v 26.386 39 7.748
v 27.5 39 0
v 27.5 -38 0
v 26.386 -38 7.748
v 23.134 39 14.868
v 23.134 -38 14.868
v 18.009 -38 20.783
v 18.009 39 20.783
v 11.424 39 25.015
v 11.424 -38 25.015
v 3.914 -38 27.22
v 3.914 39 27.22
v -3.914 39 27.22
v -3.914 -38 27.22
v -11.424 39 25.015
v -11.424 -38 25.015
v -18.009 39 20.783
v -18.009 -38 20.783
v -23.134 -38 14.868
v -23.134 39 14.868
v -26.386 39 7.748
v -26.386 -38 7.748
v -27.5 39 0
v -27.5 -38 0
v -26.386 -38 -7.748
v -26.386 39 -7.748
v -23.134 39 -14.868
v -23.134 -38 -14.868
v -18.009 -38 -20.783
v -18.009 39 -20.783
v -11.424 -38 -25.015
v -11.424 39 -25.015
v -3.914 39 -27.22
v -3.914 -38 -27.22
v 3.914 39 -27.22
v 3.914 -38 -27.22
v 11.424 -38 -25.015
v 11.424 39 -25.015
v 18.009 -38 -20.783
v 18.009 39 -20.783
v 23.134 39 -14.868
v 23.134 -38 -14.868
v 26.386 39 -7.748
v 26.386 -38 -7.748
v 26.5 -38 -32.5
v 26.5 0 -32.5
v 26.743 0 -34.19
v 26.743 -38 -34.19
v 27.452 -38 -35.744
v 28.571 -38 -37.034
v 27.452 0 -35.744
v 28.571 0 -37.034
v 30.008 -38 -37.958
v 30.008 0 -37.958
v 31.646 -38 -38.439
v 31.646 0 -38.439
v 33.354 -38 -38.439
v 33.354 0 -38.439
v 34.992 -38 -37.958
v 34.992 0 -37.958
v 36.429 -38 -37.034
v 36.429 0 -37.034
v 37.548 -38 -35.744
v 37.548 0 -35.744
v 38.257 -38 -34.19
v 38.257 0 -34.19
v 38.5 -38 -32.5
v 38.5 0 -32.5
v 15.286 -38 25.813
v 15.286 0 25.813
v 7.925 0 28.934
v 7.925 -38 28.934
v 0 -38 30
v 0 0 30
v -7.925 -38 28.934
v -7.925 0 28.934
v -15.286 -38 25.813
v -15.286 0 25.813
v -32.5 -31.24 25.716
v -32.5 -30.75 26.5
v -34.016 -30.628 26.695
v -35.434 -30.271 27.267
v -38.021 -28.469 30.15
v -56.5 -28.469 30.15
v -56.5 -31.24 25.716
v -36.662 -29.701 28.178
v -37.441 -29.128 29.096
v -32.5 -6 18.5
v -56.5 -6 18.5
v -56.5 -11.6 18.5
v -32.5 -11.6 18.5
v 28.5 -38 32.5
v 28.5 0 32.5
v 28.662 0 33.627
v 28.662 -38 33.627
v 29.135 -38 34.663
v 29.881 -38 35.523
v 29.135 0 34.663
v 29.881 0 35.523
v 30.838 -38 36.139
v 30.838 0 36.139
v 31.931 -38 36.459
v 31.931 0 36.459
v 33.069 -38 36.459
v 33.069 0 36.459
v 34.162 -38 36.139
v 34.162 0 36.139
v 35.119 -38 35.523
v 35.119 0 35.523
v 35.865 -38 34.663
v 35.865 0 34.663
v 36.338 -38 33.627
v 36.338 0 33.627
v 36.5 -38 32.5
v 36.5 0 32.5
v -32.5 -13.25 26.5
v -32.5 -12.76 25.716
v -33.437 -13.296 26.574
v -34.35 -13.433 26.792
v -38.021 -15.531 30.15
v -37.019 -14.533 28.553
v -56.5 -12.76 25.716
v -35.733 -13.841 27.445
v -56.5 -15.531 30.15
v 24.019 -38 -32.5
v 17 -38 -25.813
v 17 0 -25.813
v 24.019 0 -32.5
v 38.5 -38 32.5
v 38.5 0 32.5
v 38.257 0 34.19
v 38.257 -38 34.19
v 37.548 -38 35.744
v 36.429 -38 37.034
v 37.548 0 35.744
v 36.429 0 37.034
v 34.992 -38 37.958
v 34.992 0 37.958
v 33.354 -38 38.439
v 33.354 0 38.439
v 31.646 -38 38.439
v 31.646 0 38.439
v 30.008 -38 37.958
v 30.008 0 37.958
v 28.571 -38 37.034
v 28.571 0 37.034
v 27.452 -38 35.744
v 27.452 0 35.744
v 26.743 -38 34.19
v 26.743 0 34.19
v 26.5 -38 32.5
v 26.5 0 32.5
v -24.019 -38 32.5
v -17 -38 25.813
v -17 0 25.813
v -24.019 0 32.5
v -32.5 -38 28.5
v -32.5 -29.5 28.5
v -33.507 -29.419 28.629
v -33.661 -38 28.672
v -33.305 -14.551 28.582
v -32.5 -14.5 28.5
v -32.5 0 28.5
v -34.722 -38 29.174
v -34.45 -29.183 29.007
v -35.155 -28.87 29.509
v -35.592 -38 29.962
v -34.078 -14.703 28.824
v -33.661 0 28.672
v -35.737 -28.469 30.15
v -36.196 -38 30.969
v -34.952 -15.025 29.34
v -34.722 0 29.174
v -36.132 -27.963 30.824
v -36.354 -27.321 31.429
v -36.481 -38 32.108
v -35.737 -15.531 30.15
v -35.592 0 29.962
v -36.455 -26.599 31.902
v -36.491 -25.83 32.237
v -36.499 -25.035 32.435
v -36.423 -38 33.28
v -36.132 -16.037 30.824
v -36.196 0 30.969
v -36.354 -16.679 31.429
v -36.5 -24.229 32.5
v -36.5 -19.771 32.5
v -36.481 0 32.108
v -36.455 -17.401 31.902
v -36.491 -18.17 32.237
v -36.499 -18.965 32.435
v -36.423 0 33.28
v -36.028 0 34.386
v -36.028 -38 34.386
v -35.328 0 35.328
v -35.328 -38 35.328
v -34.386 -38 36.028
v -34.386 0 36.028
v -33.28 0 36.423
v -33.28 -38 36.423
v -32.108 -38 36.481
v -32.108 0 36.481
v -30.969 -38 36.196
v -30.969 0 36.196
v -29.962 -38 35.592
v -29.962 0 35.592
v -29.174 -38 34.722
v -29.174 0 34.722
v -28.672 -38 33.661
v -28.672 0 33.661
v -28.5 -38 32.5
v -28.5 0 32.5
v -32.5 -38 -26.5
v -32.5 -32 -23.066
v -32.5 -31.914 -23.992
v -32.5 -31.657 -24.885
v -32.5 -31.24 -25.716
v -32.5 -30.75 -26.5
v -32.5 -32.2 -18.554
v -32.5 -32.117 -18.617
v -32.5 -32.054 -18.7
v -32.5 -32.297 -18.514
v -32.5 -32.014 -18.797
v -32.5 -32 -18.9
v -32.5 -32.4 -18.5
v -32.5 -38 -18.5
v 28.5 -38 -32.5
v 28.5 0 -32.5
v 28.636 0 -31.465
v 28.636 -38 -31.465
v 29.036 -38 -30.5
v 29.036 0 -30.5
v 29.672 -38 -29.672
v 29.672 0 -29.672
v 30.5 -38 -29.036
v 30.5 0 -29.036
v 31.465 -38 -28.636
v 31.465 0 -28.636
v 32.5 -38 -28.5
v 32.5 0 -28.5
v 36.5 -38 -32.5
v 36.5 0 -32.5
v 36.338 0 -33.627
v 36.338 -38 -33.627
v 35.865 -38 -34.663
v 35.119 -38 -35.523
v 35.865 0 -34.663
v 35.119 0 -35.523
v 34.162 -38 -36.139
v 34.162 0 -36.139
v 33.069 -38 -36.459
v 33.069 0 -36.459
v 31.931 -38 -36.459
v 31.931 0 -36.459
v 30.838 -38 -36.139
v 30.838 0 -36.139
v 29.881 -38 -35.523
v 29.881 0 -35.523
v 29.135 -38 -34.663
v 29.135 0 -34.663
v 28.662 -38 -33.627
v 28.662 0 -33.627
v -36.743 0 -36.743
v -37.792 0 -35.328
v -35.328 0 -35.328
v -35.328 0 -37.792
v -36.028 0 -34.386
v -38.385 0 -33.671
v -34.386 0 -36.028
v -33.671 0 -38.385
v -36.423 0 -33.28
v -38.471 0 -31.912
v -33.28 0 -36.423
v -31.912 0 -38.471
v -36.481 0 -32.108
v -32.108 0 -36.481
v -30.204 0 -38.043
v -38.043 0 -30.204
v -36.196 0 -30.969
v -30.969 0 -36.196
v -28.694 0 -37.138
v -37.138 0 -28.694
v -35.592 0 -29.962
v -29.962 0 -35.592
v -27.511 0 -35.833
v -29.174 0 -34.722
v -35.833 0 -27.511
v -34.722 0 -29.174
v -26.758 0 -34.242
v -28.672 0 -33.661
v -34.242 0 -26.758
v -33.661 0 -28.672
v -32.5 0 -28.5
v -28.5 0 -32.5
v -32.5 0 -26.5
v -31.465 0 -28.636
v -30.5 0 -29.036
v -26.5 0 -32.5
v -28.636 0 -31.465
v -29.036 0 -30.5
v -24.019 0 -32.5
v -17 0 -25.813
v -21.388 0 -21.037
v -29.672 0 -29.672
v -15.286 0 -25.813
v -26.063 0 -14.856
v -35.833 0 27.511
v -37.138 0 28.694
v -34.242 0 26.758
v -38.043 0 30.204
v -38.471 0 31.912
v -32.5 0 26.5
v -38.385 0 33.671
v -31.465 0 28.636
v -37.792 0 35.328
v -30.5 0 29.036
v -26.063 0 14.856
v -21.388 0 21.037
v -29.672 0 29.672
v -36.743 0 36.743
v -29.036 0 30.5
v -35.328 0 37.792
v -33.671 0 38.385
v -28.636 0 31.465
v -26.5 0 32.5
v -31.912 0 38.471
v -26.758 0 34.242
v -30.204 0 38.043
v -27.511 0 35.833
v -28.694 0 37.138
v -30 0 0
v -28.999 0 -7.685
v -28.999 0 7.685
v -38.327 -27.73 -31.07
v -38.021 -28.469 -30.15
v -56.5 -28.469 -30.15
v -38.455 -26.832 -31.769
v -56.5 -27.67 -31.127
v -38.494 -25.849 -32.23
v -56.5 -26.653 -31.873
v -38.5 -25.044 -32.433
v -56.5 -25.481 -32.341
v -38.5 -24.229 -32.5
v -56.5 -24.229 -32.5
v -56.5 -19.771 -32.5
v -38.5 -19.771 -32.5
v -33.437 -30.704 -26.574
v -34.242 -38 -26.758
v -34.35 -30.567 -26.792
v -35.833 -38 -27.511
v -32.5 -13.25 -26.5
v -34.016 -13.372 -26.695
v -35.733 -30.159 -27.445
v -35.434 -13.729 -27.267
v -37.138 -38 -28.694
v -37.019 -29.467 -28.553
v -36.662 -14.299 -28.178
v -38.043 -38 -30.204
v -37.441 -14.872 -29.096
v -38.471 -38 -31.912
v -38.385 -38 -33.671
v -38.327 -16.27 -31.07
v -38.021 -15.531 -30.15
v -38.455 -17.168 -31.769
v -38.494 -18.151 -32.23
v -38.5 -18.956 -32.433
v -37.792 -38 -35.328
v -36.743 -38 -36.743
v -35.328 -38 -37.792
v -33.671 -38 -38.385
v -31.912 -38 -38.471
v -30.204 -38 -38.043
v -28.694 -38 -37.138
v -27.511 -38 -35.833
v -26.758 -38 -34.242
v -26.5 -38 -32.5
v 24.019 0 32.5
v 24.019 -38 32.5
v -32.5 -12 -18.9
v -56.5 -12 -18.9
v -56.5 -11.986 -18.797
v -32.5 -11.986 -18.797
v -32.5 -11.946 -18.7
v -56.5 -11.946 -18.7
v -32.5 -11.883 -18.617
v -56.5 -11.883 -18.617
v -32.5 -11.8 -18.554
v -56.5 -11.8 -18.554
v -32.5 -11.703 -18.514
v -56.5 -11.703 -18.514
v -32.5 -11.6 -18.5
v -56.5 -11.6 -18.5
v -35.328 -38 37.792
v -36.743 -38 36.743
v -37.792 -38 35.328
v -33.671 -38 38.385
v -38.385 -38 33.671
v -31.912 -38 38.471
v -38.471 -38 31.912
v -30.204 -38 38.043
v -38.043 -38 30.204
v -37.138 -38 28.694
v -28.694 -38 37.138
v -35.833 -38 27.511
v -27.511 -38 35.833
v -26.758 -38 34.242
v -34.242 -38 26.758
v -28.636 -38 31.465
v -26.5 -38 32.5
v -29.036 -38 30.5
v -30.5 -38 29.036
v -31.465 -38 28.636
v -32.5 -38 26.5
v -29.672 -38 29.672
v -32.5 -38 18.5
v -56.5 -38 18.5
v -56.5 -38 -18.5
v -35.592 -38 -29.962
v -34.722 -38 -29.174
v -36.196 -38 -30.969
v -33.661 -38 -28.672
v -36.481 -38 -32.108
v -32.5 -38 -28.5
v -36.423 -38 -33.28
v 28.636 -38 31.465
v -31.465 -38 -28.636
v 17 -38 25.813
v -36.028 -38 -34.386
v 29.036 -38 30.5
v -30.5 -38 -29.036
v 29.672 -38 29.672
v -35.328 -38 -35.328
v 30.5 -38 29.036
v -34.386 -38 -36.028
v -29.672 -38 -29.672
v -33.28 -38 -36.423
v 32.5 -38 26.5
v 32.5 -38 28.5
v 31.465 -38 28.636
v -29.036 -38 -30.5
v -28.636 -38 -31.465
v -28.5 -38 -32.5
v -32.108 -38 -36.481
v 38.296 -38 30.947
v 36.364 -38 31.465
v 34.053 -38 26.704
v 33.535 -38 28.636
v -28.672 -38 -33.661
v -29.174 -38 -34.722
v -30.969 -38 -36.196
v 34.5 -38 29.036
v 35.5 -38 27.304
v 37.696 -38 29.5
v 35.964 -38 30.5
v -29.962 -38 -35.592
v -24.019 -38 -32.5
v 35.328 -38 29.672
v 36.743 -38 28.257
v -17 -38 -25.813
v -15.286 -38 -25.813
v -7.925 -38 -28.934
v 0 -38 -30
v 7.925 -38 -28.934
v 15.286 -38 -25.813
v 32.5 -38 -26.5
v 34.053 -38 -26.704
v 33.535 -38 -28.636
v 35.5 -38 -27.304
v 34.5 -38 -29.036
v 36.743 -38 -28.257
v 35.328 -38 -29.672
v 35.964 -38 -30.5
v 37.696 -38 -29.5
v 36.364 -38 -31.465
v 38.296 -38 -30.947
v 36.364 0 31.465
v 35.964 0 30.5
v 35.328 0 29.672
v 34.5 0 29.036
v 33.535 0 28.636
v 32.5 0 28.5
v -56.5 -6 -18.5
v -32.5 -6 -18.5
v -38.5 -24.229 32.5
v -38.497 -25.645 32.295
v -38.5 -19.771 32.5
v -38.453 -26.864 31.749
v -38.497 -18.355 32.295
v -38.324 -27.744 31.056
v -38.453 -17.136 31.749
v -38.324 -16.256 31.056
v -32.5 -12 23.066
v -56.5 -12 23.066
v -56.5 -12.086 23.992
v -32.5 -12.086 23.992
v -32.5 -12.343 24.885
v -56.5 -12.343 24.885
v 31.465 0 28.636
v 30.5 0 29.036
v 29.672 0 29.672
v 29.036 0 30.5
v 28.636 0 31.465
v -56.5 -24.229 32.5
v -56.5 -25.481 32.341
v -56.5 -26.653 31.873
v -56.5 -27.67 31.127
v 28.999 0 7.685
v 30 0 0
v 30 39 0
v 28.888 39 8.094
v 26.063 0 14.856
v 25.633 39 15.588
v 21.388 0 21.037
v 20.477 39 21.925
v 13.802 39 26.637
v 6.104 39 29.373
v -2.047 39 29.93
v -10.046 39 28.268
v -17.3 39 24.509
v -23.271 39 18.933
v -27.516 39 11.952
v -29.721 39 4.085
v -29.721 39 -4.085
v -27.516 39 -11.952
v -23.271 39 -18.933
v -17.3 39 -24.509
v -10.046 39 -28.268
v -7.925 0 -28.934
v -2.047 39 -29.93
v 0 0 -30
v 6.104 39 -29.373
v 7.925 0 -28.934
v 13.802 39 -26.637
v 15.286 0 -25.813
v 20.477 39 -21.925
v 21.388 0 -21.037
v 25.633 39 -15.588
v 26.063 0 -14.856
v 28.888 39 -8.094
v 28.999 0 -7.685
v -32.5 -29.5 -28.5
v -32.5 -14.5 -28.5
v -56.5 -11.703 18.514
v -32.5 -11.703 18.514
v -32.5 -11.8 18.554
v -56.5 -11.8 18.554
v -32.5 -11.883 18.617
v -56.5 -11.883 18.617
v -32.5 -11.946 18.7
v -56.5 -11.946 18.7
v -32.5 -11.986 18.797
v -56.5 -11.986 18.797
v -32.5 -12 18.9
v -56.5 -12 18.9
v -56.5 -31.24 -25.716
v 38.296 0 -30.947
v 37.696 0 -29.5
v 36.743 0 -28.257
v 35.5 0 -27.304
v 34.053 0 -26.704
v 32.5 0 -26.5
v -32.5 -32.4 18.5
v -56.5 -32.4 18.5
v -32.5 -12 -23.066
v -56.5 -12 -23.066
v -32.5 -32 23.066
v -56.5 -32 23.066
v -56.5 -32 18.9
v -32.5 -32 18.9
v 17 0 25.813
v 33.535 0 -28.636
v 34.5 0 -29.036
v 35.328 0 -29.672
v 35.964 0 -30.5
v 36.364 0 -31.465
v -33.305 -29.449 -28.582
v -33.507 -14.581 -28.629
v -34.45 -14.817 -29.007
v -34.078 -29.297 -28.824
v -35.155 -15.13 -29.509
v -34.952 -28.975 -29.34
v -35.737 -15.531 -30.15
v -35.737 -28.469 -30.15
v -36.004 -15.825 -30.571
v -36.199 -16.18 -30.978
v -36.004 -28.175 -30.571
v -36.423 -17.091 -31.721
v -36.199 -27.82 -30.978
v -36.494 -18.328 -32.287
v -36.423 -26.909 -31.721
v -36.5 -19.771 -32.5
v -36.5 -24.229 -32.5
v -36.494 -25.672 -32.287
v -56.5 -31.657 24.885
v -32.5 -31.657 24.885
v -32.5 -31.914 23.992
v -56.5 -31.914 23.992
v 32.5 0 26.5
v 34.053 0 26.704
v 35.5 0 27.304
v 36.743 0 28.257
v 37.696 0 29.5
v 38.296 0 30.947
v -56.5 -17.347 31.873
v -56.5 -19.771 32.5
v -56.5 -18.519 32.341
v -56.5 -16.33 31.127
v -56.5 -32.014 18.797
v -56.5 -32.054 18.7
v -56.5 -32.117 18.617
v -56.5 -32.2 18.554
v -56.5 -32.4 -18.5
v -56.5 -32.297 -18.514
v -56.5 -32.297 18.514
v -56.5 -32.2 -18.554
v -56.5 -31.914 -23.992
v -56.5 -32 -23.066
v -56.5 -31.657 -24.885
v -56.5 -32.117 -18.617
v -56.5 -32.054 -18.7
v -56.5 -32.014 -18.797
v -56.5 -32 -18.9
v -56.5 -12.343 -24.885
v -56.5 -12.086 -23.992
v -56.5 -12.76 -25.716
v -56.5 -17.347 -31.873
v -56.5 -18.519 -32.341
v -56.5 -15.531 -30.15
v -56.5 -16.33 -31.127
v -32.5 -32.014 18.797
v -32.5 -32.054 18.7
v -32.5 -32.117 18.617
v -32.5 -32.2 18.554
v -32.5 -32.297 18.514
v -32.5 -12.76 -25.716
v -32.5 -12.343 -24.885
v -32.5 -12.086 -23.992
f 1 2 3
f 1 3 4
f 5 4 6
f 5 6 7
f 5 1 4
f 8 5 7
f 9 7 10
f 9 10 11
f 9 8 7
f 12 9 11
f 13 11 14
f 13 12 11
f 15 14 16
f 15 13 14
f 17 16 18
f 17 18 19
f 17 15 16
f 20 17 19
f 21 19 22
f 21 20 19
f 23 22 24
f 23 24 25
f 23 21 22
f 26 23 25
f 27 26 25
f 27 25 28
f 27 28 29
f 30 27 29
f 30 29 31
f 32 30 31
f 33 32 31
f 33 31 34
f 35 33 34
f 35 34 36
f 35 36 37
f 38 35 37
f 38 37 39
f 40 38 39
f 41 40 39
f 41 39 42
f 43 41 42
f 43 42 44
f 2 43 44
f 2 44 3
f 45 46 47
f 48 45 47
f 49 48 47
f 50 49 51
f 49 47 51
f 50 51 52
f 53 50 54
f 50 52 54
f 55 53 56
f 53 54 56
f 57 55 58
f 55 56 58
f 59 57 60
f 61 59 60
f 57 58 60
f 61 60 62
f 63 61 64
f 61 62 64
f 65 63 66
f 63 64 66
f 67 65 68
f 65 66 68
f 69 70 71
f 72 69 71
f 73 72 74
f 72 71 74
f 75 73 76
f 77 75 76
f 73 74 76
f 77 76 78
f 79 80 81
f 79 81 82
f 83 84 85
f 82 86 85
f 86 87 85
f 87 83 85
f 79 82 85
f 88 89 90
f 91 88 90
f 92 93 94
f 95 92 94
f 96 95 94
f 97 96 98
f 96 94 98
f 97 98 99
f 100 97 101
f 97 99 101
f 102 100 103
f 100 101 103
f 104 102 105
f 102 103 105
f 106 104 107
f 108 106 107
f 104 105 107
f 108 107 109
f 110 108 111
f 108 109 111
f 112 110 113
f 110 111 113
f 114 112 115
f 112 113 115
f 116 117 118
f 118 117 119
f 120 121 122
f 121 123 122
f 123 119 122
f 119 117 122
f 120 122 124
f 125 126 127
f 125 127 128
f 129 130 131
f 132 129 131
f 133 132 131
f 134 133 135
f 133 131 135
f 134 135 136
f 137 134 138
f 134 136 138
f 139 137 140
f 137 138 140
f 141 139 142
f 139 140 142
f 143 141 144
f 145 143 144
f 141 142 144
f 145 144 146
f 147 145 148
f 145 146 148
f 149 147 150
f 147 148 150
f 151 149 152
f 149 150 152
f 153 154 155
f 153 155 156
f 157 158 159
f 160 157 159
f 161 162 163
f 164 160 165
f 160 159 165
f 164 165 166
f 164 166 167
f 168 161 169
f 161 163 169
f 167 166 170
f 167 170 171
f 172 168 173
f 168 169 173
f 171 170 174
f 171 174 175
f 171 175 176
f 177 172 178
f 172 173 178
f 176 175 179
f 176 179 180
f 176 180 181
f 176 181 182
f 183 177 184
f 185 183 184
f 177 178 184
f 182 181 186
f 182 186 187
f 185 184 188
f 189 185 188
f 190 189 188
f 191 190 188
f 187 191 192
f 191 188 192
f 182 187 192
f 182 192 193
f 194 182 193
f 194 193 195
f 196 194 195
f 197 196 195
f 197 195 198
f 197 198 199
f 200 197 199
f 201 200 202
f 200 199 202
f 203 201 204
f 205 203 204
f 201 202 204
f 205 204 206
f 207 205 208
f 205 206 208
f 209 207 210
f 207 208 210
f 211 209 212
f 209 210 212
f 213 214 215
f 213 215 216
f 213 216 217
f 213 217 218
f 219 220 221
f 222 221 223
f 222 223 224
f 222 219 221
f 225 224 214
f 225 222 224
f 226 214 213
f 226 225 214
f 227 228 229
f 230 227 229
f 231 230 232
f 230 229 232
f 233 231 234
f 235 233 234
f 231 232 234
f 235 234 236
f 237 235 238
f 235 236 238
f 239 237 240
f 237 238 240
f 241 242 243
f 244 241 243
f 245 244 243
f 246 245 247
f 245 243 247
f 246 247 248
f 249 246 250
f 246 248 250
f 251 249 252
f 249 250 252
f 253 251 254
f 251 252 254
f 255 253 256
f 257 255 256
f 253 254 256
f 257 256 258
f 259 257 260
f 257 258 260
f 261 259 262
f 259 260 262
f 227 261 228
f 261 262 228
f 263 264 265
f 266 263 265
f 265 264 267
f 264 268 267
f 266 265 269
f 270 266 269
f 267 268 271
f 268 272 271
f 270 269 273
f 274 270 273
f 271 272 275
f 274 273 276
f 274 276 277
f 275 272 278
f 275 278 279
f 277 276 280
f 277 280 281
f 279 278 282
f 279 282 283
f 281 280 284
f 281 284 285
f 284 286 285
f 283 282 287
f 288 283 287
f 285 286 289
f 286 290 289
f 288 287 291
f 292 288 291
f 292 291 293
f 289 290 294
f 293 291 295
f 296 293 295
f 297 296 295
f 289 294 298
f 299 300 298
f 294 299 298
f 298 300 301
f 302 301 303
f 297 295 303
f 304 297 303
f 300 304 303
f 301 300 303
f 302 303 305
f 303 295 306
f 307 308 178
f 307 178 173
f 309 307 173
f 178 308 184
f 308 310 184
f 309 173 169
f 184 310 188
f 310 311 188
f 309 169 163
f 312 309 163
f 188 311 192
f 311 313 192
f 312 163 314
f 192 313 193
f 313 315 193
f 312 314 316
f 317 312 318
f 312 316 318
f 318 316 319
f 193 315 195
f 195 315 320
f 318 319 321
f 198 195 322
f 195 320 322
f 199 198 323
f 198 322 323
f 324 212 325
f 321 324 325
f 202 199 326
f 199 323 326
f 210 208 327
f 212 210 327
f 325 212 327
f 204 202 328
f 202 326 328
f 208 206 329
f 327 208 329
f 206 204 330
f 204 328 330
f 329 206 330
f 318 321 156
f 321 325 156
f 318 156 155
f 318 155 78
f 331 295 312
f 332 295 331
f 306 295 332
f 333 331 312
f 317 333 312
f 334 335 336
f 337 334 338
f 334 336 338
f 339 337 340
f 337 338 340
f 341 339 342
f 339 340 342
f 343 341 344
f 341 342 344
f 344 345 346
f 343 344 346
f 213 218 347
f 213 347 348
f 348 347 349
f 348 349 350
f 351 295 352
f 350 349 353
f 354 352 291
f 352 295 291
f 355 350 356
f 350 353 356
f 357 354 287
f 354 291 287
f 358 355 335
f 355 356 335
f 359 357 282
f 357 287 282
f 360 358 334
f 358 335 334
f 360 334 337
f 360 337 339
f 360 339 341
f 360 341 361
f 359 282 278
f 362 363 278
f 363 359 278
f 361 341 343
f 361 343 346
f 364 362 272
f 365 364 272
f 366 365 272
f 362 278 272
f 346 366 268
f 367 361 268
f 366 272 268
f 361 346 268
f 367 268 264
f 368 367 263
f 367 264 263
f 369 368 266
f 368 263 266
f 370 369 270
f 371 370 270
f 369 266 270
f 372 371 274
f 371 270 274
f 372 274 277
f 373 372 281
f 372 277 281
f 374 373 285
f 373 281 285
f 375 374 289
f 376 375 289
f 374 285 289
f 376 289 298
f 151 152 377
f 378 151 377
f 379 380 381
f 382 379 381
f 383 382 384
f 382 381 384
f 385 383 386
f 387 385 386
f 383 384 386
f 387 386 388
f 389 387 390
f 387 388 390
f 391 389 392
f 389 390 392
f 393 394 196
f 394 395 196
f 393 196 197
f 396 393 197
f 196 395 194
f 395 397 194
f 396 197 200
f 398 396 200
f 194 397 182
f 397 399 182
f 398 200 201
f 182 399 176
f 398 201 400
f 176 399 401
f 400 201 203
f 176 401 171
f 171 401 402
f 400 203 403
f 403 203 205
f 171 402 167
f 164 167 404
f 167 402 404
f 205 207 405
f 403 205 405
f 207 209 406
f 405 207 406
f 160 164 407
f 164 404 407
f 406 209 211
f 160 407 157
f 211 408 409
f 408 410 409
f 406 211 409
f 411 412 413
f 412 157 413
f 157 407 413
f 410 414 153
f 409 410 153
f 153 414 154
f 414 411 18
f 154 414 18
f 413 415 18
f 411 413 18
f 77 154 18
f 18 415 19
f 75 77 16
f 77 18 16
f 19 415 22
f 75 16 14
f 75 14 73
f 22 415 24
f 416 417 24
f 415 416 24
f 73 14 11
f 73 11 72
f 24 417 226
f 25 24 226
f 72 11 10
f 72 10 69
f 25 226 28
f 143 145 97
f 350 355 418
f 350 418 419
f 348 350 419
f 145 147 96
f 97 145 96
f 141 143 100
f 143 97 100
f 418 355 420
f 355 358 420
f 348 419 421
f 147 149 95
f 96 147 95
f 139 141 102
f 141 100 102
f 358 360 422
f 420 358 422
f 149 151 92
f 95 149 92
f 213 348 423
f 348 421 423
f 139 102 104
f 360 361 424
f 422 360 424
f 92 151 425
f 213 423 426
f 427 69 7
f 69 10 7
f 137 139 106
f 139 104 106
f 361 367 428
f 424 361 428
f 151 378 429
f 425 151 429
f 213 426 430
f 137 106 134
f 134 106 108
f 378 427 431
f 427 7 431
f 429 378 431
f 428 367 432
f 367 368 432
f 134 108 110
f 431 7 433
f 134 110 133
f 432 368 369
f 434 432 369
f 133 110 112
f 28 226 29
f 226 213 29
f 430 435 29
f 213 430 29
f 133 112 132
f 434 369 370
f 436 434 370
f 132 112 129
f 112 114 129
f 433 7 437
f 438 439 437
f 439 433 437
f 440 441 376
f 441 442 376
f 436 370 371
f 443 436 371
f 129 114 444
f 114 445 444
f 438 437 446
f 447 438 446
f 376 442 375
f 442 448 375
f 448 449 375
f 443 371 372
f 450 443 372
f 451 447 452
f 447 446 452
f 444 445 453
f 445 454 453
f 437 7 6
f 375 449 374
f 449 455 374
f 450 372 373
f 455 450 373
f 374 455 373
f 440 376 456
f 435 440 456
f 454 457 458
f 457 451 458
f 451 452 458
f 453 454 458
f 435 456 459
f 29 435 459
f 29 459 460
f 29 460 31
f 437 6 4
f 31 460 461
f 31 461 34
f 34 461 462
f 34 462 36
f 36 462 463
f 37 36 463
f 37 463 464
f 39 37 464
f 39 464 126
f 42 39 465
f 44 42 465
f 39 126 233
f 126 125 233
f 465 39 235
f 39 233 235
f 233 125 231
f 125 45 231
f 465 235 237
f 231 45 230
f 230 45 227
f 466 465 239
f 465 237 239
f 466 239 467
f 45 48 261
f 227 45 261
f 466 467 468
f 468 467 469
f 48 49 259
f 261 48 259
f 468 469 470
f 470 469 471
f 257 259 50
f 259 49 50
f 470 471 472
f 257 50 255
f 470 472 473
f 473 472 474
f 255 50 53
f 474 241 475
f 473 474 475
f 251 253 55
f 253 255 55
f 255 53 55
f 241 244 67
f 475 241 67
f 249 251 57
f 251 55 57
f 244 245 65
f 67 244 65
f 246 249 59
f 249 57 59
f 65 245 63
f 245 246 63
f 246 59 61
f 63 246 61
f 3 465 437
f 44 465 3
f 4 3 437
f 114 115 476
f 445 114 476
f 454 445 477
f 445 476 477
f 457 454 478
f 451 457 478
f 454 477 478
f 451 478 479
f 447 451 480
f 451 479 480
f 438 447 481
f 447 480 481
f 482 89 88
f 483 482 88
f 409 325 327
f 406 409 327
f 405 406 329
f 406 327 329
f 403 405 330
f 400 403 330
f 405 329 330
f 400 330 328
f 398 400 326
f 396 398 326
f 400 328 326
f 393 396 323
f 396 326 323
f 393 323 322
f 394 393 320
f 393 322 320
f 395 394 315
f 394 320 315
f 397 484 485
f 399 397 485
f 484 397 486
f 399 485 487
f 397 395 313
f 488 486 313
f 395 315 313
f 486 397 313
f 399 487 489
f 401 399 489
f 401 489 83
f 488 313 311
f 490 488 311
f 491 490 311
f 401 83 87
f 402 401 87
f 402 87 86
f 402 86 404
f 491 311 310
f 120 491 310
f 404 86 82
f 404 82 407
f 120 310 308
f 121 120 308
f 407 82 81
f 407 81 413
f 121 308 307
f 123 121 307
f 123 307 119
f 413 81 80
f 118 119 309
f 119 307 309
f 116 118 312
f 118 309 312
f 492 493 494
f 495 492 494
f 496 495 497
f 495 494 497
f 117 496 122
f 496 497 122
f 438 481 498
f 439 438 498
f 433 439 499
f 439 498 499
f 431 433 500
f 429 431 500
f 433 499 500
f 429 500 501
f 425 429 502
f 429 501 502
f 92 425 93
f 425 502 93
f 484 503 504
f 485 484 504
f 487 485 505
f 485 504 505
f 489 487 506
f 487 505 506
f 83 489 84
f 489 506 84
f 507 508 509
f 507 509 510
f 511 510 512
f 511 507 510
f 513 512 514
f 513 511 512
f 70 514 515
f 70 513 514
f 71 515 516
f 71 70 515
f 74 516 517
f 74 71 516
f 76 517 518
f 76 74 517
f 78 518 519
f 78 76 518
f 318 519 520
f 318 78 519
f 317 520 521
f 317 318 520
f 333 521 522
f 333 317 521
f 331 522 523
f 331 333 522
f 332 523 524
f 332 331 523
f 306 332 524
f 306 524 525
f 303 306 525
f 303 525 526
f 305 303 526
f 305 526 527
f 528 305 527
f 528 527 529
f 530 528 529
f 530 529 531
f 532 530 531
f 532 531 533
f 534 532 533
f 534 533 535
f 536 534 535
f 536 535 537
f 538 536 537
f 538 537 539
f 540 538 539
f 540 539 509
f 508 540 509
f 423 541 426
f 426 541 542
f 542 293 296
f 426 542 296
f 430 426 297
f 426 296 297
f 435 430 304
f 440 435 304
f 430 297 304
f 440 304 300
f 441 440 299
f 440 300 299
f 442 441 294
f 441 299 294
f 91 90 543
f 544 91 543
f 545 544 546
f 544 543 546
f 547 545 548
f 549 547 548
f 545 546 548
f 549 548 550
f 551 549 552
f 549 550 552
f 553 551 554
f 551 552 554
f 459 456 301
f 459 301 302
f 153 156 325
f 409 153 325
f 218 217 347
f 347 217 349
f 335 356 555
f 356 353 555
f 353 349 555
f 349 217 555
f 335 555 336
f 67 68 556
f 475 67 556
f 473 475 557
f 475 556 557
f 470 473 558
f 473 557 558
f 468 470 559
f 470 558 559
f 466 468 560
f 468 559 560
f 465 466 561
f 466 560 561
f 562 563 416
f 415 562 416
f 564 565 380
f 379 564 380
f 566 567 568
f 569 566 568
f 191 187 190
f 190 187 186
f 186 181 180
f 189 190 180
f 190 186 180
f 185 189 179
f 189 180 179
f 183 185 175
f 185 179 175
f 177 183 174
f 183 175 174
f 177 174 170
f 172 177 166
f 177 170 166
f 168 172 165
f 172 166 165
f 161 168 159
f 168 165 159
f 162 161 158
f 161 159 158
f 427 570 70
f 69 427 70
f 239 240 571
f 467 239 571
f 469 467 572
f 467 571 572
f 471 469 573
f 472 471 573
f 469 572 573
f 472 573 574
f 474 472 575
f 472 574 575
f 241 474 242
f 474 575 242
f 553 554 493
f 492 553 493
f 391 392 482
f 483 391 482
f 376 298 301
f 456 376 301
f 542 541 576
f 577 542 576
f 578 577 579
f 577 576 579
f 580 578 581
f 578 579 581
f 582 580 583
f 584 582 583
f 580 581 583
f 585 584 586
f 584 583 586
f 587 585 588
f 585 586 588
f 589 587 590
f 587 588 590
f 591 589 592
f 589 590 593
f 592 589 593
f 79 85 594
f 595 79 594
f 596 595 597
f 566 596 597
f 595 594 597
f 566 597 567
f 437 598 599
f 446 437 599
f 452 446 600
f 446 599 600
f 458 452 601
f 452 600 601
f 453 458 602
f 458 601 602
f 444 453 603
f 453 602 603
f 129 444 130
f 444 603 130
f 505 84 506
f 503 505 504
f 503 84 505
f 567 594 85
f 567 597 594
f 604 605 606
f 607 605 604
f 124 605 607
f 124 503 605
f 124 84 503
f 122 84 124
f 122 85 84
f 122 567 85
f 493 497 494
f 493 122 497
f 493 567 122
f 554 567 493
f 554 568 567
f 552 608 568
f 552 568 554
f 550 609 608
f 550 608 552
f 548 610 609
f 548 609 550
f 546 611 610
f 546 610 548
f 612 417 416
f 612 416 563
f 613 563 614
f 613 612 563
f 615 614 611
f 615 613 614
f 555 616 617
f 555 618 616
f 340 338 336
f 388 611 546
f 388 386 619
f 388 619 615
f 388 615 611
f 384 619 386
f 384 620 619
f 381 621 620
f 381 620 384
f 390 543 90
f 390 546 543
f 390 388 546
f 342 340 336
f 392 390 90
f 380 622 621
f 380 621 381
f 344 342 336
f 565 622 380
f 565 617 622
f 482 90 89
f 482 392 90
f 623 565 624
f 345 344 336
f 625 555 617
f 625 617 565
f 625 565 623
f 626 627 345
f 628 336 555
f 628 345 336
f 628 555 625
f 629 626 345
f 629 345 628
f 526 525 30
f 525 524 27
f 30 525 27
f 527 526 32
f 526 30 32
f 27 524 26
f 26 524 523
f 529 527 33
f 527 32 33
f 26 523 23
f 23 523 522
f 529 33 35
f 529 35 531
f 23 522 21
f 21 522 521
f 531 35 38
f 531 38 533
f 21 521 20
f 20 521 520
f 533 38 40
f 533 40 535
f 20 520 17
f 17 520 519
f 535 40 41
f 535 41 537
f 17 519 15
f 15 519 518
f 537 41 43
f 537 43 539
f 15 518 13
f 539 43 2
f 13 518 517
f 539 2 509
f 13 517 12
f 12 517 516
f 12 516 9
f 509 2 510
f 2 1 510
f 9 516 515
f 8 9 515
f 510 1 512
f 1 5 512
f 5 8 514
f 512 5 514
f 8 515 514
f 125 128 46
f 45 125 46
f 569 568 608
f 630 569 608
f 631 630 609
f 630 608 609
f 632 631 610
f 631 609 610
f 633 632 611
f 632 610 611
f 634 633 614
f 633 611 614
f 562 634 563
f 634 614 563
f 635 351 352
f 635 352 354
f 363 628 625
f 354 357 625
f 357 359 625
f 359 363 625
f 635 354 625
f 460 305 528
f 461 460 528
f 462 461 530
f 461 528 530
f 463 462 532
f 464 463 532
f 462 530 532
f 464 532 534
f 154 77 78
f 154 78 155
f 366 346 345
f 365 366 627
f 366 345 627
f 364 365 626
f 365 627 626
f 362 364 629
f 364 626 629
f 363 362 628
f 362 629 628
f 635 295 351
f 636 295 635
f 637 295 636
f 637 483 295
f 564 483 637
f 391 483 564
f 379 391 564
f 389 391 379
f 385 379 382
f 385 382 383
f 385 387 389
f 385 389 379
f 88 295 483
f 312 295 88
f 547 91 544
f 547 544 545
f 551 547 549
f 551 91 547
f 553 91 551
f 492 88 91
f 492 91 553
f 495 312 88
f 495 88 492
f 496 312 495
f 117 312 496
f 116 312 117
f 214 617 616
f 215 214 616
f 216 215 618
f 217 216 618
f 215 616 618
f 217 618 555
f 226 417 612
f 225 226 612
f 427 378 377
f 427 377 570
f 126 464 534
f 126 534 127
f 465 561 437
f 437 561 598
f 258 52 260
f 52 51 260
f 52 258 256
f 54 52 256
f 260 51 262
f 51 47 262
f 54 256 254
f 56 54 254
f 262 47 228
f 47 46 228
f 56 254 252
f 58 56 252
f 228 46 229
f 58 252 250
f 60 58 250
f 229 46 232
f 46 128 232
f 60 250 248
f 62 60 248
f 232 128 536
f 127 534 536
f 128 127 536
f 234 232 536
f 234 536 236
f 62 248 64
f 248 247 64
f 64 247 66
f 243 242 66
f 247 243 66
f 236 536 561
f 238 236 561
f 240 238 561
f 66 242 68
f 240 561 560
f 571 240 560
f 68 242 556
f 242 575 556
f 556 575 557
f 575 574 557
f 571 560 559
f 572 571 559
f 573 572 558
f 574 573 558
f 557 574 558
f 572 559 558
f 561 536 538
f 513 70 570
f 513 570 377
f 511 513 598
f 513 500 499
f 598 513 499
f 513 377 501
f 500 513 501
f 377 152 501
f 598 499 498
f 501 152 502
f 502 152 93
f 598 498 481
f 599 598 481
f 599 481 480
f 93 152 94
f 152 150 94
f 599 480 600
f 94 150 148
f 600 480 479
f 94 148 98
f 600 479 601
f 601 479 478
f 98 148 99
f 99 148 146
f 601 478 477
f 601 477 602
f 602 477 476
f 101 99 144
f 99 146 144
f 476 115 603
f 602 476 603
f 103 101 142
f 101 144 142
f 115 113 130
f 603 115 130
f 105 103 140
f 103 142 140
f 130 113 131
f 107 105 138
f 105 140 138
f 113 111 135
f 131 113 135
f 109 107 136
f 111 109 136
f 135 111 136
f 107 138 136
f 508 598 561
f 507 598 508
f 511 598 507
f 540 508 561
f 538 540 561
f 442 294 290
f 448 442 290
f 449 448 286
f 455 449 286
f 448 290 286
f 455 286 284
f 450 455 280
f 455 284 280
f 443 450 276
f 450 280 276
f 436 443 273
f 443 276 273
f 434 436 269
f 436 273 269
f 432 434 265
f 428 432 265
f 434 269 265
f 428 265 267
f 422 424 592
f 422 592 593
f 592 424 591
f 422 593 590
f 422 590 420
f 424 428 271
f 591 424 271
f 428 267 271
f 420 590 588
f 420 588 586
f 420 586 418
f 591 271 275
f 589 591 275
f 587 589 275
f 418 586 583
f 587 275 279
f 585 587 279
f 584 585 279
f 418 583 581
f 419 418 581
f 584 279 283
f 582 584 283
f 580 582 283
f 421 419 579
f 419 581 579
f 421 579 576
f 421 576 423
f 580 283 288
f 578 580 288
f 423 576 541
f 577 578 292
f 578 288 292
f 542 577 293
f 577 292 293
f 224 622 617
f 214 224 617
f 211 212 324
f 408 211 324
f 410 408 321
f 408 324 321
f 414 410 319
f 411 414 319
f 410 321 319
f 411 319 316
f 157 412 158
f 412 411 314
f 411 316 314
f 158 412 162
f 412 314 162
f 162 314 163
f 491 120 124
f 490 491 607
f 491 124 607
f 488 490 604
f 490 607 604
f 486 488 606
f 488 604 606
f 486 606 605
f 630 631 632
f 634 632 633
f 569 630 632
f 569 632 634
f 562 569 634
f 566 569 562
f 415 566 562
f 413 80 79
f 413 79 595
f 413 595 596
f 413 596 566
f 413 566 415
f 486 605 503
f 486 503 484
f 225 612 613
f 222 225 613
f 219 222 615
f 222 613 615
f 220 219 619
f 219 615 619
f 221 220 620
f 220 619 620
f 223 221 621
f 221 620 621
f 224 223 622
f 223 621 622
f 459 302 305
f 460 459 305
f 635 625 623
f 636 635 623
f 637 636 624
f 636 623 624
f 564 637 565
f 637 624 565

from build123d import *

# Parameters (mm, degrees)
F0_R      = 30
F0_R_2    = 27.5
F1_DEPTH  = 38
F3_R      = 30
F3_R_2    = 27.5
F4_DEPTH  = 40
F6_W      = 24
F6_H      = 32
F7_DEPTH  = 65
F9_DEPTH  = 24
F10_DEPTH = 38
F12_DEPTH = 38
F13_R     = 4
F14_DEPTH = 38


with BuildPart() as f1:
    # F0 (on Front) → F1 (new body)
    with BuildSketch(Plane.XZ):
        with BuildLine():
            ThreePointArc((-32.5, 26.5), (-28.2573593129, 28.2573593129), (-26.5, 32.5))
            Line((-26.5, 32.5), (-28.5, 32.5))
            ThreePointArc((-28.5, 32.5), (-29.6715728753, 29.6715728753), (-32.5, 28.5))
            Line((-32.5, 28.5), (-32.5, 26.5))
        make_face()
        with BuildLine():
            Line((-28.5, 32.5), (-26.5, 32.5))
            ThreePointArc((-26.5, 32.5), (-36.7426406871, 36.7426406871), (-32.5, 26.5))
            Line((-32.5, 26.5), (-32.5, 28.5))
            ThreePointArc((-32.5, 28.5), (-35.3284271247, 35.3284271247), (-28.5, 32.5))
        make_face()
        with BuildLine():
            Line((26.5, 32.5), (-26.5, 32.5))
            ThreePointArc((-26.5, 32.5), (-28.2573593129, 28.2573593129), (-32.5, 26.5))
            Line((-32.5, 26.5), (-32.5, -26.5))
            ThreePointArc((-32.5, -26.5), (-28.2573593129, -28.2573593129), (-26.5, -32.5))
            Line((-26.5, -32.5), (26.5, -32.5))
            ThreePointArc((26.5, -32.5), (28.2573593129, -28.2573593129), (32.5, -26.5))
            Line((32.5, -26.5), (32.5, 26.5))
            ThreePointArc((32.5, 26.5), (28.2573593129, 28.2573593129), (26.5, 32.5))
        make_face()
        Circle(F0_R, mode=Mode.SUBTRACT)
        with BuildLine():
            ThreePointArc((38.5, 32.5), (32.5, 38.5), (26.5, 32.5))
            Line((26.5, 32.5), (28.5, 32.5))
            ThreePointArc((28.5, 32.5), (32.5, 36.5), (36.5, 32.5))
            ThreePointArc((36.5, 32.5), (35.3284271247, 29.6715728753), (32.5, 28.5))
            Line((32.5, 28.5), (32.5, 26.5))
            ThreePointArc((32.5, 26.5), (36.7426406871, 28.2573593129), (38.5, 32.5))
        make_face()
        with BuildLine():
            Line((28.5, 32.5), (26.5, 32.5))
            ThreePointArc((26.5, 32.5), (28.2573593129, 28.2573593129), (32.5, 26.5))
            Line((32.5, 26.5), (32.5, 28.5))
            ThreePointArc((32.5, 28.5), (29.6715728753, 29.6715728753), (28.5, 32.5))
        make_face()
        with BuildLine():
            ThreePointArc((-26.5, -32.5), (-28.2573593129, -28.2573593129), (-32.5, -26.5))
            Line((-32.5, -26.5), (-32.5, -28.5))
            ThreePointArc((-32.5, -28.5), (-29.6715728753, -29.6715728753), (-28.5, -32.5))
            Line((-28.5, -32.5), (-26.5, -32.5))
        make_face()
        with BuildLine():
            Line((-32.5, -28.5), (-32.5, -26.5))
            ThreePointArc((-32.5, -26.5), (-36.7426406871, -36.7426406871), (-26.5, -32.5))
            Line((-26.5, -32.5), (-28.5, -32.5))
            ThreePointArc((-28.5, -32.5), (-35.3284271247, -35.3284271247), (-32.5, -28.5))
        make_face()
        with BuildLine():
            ThreePointArc((38.5, -32.5), (36.7426406871, -28.2573593129), (32.5, -26.5))
            Line((32.5, -26.5), (32.5, -28.5))
            ThreePointArc((32.5, -28.5), (35.3284271247, -29.6715728753), (36.5, -32.5))
            ThreePointArc((36.5, -32.5), (32.5, -36.5), (28.5, -32.5))
            Line((28.5, -32.5), (26.5, -32.5))
            ThreePointArc((26.5, -32.5), (32.5, -38.5), (38.5, -32.5))
        make_face()
        with BuildLine():
            Line((32.5, -28.5), (32.5, -26.5))
            ThreePointArc((32.5, -26.5), (28.2573593129, -28.2573593129), (26.5, -32.5))
            Line((26.5, -32.5), (28.5, -32.5))
            ThreePointArc((28.5, -32.5), (29.6715728753, -29.6715728753), (32.5, -28.5))
        make_face()
        Circle(F0_R)
        Circle(F0_R_2, mode=Mode.SUBTRACT)
    extrude(amount=F1_DEPTH)

    # F3 (on offset) → F4 (join)
    with BuildSketch(Plane.XZ.offset(1)):
        Circle(F3_R)
        Circle(F3_R_2, mode=Mode.SUBTRACT)
    extrude(amount=-F4_DEPTH)

    # F6 (on offset) → F7 (join)
    with BuildSketch(Plane.XY.offset(-32.5)):
        with Locations((-44.5, -22)):
            Rectangle(F6_W, F6_H)
    extrude(amount=F7_DEPTH)

    # F8 (on face) → F9 (cut)
    with BuildSketch(Plane(origin=(-56.5, 0, 0), x_dir=(0, -1, 0), z_dir=(-1, 0, 0))):
        with BuildLine():
            Line((11.5996693186, -18.5), (6, -18.5))
            Line((6, -18.5), (6, -32.5))
            Line((6, -32.5), (19.7712382075, -32.5))
            ThreePointArc((19.7712382075, -32.5), (17.3473955456, -31.8732124062), (15.5312466875, -30.1499947))
            Line((15.5312466875, -30.1499947), (12.76000848, -25.716013568))
            ThreePointArc((12.76000848, -25.716013568), (12.1937562692, -24.4444314332), (12, -23.0660188679))
            Line((12, -23.0660188679), (12, -18.9003306814))
            ThreePointArc((12, -18.9003306814), (11.8827458581, -18.6172541419), (11.5996693186, -18.5))
        make_face()
        with BuildLine():
            ThreePointArc((28.4687533125, -30.1499947), (26.6526044544, -31.8732124062), (24.2287617925, -32.5))
            Line((24.2287617925, -32.5), (38, -32.5))
            Line((38, -32.5), (38, -18.5))
            Line((38, -18.5), (32.4003306814, -18.5))
            ThreePointArc((32.4003306814, -18.5), (32.1172541419, -18.6172541419), (32, -18.9003306814))
            Line((32, -18.9003306814), (32, -23.0660188679))
            ThreePointArc((32, -23.0660188679), (31.8062437308, -24.4444314332), (31.23999152, -25.716013568))
            Line((31.23999152, -25.716013568), (28.4687533125, -30.1499947))
        make_face()
        with BuildLine():
            Line((19.7712382075, 32.5), (6, 32.5))
            Line((6, 32.5), (6, 18.5))
            Line((6, 18.5), (11.5996693186, 18.5))
            ThreePointArc((11.5996693186, 18.5), (11.8827458581, 18.6172541419), (12, 18.9003306814))
            Line((12, 18.9003306814), (12, 23.0660188679))
            ThreePointArc((12, 23.0660188679), (12.1937562692, 24.4444314332), (12.76000848, 25.716013568))
            Line((12.76000848, 25.716013568), (15.5312466875, 30.1499947))
            ThreePointArc((15.5312466875, 30.1499947), (17.3473955456, 31.8732124062), (19.7712382075, 32.5))
        make_face()
        with BuildLine():
            Line((38, 32.5), (24.2287617925, 32.5))
            ThreePointArc((24.2287617925, 32.5), (26.6526044544, 31.8732124062), (28.4687533125, 30.1499947))
            Line((28.4687533125, 30.1499947), (31.23999152, 25.716013568))
            ThreePointArc((31.23999152, 25.716013568), (31.8062437308, 24.4444314332), (32, 23.0660188679))
            Line((32, 23.0660188679), (32, 18.9003306814))
            ThreePointArc((32, 18.9003306814), (32.1172541419, 18.6172541419), (32.4003306814, 18.5))
            Line((32.4003306814, 18.5), (38, 18.5))
            Line((38, 18.5), (38, 32.5))
        make_face()
    extrude(amount=-F9_DEPTH, mode=Mode.SUBTRACT)

    # F0 (on Front) → F10 (join)
    with BuildSketch(Plane.XZ):
        with BuildLine():
            ThreePointArc((38.5, 32.5), (32.5, 38.5), (26.5, 32.5))
            Line((26.5, 32.5), (28.5, 32.5))
            ThreePointArc((28.5, 32.5), (32.5, 36.5), (36.5, 32.5))
            ThreePointArc((36.5, 32.5), (35.3284271247, 29.6715728753), (32.5, 28.5))
            Line((32.5, 28.5), (32.5, 26.5))
            ThreePointArc((32.5, 26.5), (36.7426406871, 28.2573593129), (38.5, 32.5))
        make_face()
        with BuildLine():
            Line((-28.5, 32.5), (-26.5, 32.5))
            ThreePointArc((-26.5, 32.5), (-36.7426406871, 36.7426406871), (-32.5, 26.5))
            Line((-32.5, 26.5), (-32.5, 28.5))
            ThreePointArc((-32.5, 28.5), (-35.3284271247, 35.3284271247), (-28.5, 32.5))
        make_face()
        with BuildLine():
            ThreePointArc((38.5, -32.5), (36.7426406871, -28.2573593129), (32.5, -26.5))
            Line((32.5, -26.5), (32.5, -28.5))
            ThreePointArc((32.5, -28.5), (35.3284271247, -29.6715728753), (36.5, -32.5))
            ThreePointArc((36.5, -32.5), (32.5, -36.5), (28.5, -32.5))
            Line((28.5, -32.5), (26.5, -32.5))
            ThreePointArc((26.5, -32.5), (32.5, -38.5), (38.5, -32.5))
        make_face()
        with BuildLine():
            Line((-32.5, -28.5), (-32.5, -26.5))
            ThreePointArc((-32.5, -26.5), (-36.7426406871, -36.7426406871), (-26.5, -32.5))
            Line((-26.5, -32.5), (-28.5, -32.5))
            ThreePointArc((-28.5, -32.5), (-35.3284271247, -35.3284271247), (-32.5, -28.5))
        make_face()
    extrude(amount=F10_DEPTH)

    # F11 (on face) → F12 (cut)
    with BuildSketch(Plane(origin=(0, 0, 0), x_dir=(-1, 0, 0), z_dir=(0, 1, 0))):
        with BuildLine():
            Line((24.019457768, 32.5), (-24.019457768, 32.5))
            Line((-24.019457768, 32.5), (-17, 25.8134707125))
            Line((-17, 25.8134707125), (-15.2860959625, 25.8134707125))
            ThreePointArc((-15.2860959625, 25.8134707125), (0, 30), (15.2860959625, 25.8134707125))
            Line((15.2860959625, 25.8134707125), (17, 25.8134707125))
            Line((17, 25.8134707125), (24.019457768, 32.5))
        make_face()
        with BuildLine():
            Line((-17, -25.8134707125), (-24.019457768, -32.5))
            Line((-24.019457768, -32.5), (24.019457768, -32.5))
            Line((24.019457768, -32.5), (17, -25.8134707125))
            Line((17, -25.8134707125), (15.2860959625, -25.8134707125))
            ThreePointArc((15.2860959625, -25.8134707125), (0, -30), (-15.2860959625, -25.8134707125))
            Line((-15.2860959625, -25.8134707125), (-17, -25.8134707125))
        make_face()
    extrude(amount=-F12_DEPTH, mode=Mode.SUBTRACT)

    # F13 (on face) → F14 (cut)
    with BuildSketch(Plane.XZ.offset(38)):
        with Locations((-32.5, 32.5)):
            Circle(F13_R)
        with Locations((-32.5, -32.5)):
            Circle(F13_R)
    extrude(amount=-F14_DEPTH, mode=Mode.SUBTRACT)


solid = f1.part
